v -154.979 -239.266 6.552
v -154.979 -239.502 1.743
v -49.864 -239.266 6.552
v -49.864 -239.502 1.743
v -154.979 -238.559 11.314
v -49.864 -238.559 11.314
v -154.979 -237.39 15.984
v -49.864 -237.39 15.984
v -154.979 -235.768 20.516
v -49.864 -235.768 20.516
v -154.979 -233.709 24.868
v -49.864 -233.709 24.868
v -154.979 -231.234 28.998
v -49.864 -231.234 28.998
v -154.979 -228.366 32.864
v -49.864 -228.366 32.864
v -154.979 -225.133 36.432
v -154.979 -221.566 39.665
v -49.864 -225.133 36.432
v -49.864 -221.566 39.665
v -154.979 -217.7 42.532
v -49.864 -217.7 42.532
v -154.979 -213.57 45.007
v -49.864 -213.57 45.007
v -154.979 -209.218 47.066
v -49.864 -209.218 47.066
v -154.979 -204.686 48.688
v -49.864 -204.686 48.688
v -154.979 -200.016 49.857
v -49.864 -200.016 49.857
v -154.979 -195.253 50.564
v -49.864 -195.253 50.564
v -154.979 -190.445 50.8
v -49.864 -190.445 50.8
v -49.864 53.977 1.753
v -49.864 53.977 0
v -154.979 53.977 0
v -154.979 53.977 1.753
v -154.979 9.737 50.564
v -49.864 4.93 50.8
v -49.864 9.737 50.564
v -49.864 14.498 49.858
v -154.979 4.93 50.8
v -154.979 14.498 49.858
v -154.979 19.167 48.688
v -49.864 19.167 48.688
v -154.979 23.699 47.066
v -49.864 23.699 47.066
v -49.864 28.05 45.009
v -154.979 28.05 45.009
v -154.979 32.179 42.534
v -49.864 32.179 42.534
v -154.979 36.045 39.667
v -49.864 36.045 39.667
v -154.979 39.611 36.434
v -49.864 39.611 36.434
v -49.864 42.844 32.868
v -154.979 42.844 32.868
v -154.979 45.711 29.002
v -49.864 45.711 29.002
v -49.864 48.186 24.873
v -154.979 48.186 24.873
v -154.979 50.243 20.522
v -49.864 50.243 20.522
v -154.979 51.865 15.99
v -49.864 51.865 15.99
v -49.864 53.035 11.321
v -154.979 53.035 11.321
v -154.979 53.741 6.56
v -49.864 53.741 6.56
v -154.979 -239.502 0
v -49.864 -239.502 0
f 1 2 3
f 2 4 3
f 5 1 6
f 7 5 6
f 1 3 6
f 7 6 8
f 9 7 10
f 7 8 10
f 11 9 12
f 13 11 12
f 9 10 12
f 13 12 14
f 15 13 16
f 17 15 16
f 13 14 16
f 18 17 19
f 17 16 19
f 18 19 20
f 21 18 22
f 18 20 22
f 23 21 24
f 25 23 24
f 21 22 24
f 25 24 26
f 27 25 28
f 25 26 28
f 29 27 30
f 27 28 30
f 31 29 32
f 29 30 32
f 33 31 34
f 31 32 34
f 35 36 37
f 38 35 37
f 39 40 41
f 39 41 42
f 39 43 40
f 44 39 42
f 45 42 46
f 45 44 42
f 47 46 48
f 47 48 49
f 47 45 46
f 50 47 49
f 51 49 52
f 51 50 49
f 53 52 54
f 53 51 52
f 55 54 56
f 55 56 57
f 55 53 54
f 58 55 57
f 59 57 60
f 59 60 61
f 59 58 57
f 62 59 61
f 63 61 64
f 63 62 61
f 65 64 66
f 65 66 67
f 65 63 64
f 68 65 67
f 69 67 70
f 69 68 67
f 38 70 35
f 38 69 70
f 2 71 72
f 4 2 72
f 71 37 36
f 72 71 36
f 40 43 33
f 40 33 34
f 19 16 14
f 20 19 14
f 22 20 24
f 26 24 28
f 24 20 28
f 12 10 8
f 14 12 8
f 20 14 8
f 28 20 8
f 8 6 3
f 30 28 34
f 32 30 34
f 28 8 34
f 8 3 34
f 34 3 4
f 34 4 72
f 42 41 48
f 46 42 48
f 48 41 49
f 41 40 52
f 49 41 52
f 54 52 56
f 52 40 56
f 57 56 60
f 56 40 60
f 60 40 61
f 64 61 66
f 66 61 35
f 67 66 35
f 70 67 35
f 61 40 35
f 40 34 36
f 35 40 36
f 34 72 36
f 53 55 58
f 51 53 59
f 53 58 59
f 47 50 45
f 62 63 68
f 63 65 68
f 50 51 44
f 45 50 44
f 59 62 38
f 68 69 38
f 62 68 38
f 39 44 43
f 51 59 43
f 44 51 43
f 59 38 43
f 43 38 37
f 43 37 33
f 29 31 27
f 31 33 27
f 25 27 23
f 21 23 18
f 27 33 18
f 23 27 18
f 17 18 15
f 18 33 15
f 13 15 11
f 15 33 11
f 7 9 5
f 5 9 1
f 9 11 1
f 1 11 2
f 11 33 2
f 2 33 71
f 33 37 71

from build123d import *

# Parameters (mm, degrees)
F1_DEPTH = 50.8
F2_R     = 49.05682
F3_R     = 49.0474


with BuildPart() as f1:
    # F0 (on Top) → F1 (new body)
    with BuildSketch(Plane.XY):
        Polygon((-49.864192, 53.976998), (-154.979095, 53.976998), (-154.979095, -239.501879), (-49.864192, -239.501879), (-49.864192, -202.062055), align=None)
    extrude(amount=F1_DEPTH)

    # F2
    f2_edges = [f1.edges().sort_by_distance(p)[0] for p in [
        (-102.421643, -239.501879, 50.8),
    ]]
    fillet(f2_edges, radius=F2_R)

    # F3
    f3_edges = [f1.edges().sort_by_distance(p)[0] for p in [
        (-102.421643, 53.976998, 50.8),
    ]]
    fillet(f3_edges, radius=F3_R)


solid = f1.part
